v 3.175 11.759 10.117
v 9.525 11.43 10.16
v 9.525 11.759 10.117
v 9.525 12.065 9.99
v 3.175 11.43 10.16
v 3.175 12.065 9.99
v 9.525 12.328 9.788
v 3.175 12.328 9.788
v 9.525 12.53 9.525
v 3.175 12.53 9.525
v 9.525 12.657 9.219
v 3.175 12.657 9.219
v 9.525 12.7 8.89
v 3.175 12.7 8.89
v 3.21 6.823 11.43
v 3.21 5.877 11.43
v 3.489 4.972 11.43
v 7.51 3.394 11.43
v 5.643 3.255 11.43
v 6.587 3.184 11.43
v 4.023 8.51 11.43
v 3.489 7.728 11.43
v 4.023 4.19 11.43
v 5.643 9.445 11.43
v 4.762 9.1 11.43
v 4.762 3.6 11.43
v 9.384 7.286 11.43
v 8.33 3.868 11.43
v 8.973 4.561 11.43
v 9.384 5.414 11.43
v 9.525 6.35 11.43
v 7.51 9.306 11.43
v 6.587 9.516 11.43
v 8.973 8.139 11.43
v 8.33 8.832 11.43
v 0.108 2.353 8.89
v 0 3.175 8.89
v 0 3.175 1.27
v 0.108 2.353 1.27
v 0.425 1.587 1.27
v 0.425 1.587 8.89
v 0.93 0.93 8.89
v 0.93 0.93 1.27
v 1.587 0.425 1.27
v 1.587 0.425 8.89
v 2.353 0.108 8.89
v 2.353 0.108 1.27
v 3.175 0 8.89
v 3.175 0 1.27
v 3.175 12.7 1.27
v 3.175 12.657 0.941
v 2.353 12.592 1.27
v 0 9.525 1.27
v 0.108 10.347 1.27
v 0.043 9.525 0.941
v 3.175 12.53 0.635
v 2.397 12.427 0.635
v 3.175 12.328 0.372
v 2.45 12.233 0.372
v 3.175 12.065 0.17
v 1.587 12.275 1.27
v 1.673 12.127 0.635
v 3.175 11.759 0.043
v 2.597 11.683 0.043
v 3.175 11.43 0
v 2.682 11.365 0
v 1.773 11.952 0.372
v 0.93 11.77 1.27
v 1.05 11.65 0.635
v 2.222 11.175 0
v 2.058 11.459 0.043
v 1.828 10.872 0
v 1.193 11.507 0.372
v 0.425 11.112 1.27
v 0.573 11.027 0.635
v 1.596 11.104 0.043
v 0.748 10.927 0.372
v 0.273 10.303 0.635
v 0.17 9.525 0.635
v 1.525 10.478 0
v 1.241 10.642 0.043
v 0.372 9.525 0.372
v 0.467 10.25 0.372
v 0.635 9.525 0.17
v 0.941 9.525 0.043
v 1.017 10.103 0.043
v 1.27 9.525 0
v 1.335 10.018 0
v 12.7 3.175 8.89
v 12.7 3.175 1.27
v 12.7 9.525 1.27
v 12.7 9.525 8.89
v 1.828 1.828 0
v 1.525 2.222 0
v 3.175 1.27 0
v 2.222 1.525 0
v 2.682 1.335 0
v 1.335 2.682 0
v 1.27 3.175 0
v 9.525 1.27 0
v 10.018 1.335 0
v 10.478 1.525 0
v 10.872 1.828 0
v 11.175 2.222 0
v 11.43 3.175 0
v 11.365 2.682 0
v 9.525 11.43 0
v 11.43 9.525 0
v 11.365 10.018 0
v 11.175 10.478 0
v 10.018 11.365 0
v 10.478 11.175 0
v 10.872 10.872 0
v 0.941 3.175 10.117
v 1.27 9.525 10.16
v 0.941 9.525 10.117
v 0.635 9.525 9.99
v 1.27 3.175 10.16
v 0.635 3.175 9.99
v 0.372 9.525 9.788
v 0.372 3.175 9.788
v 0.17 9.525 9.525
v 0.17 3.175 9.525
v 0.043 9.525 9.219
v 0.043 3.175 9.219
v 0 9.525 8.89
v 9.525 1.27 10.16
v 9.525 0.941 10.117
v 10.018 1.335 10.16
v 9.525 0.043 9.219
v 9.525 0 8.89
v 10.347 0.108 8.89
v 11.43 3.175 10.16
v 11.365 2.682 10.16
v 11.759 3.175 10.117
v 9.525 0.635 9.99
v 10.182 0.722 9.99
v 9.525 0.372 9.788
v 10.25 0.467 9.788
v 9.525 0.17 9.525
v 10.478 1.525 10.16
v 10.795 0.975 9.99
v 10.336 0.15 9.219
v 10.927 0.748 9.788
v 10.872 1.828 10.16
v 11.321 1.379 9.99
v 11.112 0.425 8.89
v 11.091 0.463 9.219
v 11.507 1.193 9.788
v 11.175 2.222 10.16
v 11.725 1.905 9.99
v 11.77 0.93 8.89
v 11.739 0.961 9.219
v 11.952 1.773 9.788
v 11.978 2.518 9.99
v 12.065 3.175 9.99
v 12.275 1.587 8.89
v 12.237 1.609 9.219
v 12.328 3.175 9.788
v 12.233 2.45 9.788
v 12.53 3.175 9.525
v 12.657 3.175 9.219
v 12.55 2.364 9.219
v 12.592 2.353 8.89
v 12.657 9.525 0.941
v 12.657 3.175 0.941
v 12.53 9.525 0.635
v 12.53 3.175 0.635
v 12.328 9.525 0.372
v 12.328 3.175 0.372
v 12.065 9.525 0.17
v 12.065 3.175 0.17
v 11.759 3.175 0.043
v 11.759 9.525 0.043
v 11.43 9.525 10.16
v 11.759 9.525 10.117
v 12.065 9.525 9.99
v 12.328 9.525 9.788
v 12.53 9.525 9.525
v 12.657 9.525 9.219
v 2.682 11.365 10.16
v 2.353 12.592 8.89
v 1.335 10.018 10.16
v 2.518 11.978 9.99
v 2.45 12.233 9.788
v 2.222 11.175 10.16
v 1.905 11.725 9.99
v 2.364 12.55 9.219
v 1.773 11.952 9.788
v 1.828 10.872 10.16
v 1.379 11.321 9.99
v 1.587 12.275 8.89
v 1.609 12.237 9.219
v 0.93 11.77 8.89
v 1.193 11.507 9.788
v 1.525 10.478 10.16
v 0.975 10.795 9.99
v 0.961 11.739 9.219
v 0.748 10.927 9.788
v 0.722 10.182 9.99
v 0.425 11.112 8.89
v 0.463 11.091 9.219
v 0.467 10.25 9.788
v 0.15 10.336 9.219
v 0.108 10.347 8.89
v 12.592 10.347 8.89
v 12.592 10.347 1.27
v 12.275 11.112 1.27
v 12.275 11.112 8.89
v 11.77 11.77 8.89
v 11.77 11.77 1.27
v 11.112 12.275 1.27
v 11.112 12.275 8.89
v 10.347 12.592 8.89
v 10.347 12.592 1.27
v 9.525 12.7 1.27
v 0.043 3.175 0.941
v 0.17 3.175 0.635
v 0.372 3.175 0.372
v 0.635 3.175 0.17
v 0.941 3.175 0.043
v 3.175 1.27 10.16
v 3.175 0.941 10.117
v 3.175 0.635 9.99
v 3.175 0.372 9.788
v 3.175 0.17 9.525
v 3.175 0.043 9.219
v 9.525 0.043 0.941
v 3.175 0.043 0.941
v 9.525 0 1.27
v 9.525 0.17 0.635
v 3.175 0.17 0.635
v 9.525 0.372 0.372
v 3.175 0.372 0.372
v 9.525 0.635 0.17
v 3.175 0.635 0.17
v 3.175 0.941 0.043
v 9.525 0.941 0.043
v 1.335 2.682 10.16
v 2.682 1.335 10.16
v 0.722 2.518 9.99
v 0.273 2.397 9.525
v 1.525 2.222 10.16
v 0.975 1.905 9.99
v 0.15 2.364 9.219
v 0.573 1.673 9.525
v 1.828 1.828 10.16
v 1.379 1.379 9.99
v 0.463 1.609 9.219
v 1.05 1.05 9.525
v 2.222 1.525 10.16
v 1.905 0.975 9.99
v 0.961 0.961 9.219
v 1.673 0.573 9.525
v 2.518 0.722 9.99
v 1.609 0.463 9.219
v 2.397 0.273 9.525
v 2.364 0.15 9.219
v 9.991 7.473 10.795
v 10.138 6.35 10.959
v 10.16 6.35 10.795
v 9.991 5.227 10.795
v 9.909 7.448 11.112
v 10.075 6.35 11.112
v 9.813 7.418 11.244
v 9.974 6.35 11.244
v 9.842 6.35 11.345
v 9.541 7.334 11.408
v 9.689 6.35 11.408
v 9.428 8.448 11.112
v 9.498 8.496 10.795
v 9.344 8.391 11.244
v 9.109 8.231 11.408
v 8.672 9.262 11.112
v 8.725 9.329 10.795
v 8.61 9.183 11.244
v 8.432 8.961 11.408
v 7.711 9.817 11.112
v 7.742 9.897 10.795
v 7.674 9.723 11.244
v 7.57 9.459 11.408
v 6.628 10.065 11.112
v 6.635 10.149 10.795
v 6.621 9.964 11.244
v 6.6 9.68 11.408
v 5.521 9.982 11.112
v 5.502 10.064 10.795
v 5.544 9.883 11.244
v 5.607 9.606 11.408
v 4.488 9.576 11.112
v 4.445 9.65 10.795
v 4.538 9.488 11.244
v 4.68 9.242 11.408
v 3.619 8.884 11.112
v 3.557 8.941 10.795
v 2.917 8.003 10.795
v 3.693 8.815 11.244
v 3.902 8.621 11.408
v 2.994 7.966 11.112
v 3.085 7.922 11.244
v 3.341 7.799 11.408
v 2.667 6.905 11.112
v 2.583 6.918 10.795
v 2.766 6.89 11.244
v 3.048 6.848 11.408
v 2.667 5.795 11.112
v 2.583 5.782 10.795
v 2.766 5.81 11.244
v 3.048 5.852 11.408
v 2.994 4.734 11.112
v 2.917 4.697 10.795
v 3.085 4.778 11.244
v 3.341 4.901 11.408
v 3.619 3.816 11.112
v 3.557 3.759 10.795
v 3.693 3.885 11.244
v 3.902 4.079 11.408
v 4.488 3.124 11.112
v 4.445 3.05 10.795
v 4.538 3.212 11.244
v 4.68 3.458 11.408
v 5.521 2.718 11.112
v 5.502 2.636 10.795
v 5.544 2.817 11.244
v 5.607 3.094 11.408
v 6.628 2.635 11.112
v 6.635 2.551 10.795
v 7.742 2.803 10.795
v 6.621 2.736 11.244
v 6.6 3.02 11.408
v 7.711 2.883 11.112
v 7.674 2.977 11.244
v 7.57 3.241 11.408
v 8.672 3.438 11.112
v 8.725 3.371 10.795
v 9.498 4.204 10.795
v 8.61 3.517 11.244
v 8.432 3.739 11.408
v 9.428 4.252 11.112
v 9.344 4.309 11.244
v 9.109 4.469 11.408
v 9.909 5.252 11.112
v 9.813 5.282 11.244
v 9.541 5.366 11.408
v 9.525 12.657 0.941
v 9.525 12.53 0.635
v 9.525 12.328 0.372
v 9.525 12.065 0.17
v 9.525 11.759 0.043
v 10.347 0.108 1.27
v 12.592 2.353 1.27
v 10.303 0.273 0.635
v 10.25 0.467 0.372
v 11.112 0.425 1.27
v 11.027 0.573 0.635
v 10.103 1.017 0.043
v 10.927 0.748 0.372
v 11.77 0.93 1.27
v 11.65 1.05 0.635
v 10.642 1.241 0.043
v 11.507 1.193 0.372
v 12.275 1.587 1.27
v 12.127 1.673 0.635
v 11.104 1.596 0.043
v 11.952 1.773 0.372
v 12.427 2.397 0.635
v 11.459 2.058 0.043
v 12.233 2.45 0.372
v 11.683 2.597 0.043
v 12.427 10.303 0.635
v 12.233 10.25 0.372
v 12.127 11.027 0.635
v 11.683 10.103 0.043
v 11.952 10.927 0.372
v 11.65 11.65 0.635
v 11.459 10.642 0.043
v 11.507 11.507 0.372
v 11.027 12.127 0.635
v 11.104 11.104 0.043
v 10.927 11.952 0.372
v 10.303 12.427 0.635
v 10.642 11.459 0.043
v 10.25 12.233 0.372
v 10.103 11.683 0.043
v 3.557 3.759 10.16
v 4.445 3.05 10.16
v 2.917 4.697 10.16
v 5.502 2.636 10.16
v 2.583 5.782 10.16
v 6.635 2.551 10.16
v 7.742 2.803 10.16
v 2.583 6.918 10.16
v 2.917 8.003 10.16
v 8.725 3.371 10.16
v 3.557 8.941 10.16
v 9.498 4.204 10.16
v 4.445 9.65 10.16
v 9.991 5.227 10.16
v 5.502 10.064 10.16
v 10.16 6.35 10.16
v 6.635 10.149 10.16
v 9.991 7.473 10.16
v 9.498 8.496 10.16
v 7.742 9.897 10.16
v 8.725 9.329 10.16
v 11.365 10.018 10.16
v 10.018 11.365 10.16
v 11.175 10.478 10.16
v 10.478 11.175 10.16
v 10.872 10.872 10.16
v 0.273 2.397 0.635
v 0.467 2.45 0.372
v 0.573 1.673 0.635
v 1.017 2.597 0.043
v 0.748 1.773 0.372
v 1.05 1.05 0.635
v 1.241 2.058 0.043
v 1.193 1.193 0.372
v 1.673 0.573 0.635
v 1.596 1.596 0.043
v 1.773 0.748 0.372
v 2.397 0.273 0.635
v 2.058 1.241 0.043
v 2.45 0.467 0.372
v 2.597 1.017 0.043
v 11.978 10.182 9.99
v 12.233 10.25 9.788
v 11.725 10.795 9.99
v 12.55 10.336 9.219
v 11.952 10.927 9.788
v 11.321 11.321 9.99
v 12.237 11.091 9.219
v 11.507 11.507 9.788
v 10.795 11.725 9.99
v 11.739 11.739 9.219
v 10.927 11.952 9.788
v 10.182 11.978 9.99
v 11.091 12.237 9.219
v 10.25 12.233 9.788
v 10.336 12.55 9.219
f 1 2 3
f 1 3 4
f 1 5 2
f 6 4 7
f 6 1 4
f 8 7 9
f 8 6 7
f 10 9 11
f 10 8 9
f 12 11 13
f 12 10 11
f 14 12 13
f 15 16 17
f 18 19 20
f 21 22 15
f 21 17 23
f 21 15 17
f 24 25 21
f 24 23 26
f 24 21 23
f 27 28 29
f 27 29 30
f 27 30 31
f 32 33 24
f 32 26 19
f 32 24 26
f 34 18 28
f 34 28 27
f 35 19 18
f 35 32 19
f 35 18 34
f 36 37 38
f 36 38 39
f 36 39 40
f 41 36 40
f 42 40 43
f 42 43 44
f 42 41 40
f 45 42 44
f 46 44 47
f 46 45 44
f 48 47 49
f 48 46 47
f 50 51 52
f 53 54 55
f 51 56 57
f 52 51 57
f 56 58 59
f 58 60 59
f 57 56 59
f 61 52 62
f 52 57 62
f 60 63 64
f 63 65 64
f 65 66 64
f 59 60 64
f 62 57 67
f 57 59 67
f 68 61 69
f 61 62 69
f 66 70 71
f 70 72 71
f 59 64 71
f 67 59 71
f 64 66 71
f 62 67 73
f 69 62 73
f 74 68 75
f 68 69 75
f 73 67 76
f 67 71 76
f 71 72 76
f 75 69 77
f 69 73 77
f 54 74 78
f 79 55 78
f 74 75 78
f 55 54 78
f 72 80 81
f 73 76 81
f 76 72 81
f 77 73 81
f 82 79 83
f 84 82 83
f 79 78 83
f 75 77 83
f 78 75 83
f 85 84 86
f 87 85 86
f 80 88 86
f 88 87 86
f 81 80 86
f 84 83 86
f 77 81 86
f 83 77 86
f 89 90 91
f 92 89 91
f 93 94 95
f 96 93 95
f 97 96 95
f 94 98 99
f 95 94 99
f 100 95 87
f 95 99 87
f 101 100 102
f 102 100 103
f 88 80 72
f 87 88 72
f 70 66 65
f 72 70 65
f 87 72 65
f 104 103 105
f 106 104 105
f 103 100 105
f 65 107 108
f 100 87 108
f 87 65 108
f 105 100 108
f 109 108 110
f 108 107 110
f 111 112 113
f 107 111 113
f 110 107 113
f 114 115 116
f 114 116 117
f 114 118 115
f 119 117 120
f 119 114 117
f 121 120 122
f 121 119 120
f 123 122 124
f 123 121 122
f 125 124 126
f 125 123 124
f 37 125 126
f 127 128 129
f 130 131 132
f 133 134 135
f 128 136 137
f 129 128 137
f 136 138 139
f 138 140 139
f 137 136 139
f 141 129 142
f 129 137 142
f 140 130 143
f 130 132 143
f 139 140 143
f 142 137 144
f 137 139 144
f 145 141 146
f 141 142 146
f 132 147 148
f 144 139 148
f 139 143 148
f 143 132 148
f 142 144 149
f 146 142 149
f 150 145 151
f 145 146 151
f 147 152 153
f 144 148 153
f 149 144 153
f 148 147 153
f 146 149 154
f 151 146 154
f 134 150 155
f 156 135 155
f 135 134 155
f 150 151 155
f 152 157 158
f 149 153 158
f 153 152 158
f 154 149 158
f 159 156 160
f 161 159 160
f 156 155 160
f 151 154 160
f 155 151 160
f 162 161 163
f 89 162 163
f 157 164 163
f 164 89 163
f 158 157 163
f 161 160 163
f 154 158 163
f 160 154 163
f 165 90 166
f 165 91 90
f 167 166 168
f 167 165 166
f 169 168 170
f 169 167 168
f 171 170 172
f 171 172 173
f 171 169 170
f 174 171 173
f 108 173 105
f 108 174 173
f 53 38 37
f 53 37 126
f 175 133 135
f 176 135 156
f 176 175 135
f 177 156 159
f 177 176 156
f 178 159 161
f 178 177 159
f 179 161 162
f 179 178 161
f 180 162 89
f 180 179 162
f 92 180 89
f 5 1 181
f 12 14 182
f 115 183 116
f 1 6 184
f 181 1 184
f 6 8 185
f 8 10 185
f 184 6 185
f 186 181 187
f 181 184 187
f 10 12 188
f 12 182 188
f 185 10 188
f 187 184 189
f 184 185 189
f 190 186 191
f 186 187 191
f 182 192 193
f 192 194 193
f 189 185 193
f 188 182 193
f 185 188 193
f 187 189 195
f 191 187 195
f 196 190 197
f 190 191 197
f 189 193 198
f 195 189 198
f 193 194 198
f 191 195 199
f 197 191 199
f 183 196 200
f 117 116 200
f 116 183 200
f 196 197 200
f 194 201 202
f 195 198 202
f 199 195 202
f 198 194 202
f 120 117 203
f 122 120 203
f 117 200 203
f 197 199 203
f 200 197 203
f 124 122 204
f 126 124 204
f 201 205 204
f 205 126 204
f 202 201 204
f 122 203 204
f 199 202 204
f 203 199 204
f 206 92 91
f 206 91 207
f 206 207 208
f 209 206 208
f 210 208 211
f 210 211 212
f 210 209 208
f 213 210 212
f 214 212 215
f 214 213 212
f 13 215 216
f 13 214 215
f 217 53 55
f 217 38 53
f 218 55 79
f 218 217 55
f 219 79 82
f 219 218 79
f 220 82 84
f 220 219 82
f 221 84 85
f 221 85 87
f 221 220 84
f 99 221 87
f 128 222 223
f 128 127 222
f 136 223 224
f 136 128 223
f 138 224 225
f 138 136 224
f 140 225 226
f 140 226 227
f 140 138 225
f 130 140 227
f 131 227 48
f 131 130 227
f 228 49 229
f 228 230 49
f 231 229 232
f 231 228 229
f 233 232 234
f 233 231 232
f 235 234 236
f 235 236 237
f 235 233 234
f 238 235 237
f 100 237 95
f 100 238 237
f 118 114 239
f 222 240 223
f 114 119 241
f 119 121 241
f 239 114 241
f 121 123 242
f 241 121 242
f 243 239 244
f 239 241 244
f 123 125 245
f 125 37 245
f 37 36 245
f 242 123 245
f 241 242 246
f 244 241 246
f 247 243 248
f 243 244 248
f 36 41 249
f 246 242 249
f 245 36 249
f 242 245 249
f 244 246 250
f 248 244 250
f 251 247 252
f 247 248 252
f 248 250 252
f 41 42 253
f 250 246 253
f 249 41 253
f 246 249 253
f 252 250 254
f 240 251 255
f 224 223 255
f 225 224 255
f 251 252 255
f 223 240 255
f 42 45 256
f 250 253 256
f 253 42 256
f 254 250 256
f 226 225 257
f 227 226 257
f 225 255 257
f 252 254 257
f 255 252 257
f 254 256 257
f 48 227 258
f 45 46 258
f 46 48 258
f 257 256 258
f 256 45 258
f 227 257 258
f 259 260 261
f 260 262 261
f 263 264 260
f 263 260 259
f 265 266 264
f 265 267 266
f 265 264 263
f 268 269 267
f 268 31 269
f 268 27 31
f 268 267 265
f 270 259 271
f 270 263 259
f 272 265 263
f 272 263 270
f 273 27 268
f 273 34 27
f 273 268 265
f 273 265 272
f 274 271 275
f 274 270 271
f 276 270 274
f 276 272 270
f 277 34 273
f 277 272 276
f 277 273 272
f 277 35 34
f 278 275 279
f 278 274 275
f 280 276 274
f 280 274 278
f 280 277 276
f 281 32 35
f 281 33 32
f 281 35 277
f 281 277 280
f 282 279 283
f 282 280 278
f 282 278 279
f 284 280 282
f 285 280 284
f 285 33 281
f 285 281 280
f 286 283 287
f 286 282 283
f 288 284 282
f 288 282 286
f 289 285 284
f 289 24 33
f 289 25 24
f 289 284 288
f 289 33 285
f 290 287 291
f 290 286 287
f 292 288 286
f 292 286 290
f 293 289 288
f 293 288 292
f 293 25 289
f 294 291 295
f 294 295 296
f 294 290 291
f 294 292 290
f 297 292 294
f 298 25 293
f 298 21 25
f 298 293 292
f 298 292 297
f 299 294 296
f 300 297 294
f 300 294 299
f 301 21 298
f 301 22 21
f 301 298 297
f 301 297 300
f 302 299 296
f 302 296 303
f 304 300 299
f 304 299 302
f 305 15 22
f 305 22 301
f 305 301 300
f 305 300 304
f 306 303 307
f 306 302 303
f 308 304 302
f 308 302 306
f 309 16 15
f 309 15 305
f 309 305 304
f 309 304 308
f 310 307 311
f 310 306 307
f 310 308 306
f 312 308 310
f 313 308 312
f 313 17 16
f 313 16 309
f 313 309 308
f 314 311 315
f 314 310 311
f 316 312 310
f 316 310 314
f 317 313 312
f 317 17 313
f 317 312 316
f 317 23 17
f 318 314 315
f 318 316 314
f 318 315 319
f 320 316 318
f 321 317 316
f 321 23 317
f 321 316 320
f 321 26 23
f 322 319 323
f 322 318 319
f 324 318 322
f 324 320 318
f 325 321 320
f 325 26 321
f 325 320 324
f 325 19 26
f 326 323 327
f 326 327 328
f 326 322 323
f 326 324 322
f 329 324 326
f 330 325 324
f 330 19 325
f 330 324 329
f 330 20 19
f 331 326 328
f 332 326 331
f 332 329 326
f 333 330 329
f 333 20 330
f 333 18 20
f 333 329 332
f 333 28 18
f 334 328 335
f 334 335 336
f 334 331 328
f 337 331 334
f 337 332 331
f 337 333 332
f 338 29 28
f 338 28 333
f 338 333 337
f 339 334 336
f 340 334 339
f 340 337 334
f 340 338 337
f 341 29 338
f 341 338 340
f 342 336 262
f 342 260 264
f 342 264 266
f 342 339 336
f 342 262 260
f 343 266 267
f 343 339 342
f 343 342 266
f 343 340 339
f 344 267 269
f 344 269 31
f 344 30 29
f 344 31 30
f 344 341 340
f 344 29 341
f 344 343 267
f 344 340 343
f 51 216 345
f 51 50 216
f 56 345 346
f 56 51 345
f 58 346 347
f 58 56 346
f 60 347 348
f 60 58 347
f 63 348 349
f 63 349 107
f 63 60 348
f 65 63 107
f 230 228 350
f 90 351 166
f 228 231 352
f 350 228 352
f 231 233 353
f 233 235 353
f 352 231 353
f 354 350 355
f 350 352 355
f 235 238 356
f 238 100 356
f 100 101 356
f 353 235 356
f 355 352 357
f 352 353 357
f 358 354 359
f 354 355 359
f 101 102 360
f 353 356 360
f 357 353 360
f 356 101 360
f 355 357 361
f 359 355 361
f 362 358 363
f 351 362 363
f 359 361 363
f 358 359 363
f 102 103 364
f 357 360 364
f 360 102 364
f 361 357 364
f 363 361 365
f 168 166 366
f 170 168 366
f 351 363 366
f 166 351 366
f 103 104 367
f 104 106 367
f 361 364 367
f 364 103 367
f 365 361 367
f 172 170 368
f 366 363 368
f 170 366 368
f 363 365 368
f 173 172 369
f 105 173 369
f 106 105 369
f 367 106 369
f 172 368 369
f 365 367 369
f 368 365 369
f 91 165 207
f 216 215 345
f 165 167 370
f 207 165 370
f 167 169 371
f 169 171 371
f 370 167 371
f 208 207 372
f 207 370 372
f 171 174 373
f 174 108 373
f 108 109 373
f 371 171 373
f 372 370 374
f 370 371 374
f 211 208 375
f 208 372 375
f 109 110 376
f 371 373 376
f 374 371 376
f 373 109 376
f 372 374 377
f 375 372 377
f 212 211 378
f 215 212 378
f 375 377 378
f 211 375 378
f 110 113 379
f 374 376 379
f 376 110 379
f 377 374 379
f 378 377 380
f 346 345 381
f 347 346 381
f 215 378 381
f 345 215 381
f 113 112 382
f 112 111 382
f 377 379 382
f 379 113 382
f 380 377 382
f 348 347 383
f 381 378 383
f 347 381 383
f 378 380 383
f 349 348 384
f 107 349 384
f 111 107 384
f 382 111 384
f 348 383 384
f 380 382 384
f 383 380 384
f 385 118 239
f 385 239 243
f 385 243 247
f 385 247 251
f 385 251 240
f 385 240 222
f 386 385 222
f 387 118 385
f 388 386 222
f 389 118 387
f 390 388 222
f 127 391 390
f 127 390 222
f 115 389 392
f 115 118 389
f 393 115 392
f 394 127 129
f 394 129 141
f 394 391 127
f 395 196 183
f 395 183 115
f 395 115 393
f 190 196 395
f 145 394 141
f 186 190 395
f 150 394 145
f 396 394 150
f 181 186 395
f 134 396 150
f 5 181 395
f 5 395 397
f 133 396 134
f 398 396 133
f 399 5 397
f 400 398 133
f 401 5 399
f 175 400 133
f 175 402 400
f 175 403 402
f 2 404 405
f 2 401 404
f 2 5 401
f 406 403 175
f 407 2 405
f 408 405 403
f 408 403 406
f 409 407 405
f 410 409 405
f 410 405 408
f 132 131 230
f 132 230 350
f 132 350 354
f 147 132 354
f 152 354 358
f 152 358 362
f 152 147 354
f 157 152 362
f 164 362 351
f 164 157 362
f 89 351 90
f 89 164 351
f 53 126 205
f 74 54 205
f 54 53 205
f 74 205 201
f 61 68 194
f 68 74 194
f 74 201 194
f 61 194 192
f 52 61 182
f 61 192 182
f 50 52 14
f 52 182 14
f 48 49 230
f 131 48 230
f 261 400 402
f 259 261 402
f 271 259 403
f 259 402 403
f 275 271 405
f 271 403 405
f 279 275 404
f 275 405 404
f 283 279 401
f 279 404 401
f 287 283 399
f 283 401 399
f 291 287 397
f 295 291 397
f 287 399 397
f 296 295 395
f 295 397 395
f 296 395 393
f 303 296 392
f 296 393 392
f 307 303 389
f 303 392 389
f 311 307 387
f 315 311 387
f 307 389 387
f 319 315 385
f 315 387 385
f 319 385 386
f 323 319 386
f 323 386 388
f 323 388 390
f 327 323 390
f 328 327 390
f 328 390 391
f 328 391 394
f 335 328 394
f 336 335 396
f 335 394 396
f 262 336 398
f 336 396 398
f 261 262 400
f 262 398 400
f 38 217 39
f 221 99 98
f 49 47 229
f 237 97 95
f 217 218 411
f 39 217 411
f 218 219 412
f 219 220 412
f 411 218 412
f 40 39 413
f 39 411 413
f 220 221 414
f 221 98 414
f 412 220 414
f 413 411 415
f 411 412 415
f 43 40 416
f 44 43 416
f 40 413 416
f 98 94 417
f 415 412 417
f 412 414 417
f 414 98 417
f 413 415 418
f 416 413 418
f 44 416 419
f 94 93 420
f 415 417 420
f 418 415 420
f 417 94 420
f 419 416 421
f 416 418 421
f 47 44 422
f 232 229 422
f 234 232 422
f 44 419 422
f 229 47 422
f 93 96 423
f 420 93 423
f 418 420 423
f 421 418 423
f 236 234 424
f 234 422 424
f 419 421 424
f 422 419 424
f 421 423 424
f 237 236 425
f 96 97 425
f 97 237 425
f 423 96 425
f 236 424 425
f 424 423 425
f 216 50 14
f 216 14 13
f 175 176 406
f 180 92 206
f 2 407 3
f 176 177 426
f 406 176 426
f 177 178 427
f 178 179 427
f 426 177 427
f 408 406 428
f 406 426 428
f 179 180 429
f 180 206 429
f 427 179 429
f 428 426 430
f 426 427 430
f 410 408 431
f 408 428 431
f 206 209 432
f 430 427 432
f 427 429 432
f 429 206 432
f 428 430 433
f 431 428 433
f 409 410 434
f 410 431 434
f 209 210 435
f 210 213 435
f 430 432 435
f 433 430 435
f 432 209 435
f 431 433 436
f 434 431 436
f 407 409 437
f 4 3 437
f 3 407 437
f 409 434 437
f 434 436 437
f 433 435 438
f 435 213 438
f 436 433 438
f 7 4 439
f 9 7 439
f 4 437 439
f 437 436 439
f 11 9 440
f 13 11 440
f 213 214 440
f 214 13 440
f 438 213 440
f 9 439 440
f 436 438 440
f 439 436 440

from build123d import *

# Parameters (mm, degrees)
F0_W     = 12.7
F0_H     = 12.7
F1_DEPTH = 10.16
F2_R     = 3.175
F3_R     = 1.27
F4_R     = 3.81
F5_DEPTH = 1.27
F6_R     = 0.635
F7_R     = 1.27


with BuildPart() as f1:
    # F0 (on Top) → F1 (new body)
    with BuildSketch(Plane.XY):
        with Locations((6.35, 6.35)):
            Rectangle(F0_W, F0_H)
    extrude(amount=F1_DEPTH)

    # F2
    f2_edges = [f1.edges().sort_by_distance(p)[0] for p in [
        (0, 0, 5.08),
        (12.7, 0, 5.08),
        (12.7, 12.7, 5.08),
        (0, 12.7, 5.08),
    ]]
    fillet(f2_edges, radius=F2_R)

    # F3
    f3_edges = [f1.edges().sort_by_distance(p)[0] for p in [
        (6.35, 0, 10.16),
    ]]
    fillet(f3_edges, radius=F3_R)

    # F4 (on face) → F5 (join)
    with BuildSketch(Plane.XY.offset(10.16)):
        with Locations((6.35, 6.35)):
            Circle(F4_R)
    extrude(amount=F5_DEPTH)

    # F6
    f6_edges = [f1.edges().sort_by_distance(p)[0] for p in [
        (2.54, 6.35, 11.43),
    ]]
    fillet(f6_edges, radius=F6_R)

    # F7
    f7_edges = [f1.edges().sort_by_distance(p)[0] for p in [
        (0.929936, 0.929936, 0),
    ]]
    fillet(f7_edges, radius=F7_R)


solid = f1.part
